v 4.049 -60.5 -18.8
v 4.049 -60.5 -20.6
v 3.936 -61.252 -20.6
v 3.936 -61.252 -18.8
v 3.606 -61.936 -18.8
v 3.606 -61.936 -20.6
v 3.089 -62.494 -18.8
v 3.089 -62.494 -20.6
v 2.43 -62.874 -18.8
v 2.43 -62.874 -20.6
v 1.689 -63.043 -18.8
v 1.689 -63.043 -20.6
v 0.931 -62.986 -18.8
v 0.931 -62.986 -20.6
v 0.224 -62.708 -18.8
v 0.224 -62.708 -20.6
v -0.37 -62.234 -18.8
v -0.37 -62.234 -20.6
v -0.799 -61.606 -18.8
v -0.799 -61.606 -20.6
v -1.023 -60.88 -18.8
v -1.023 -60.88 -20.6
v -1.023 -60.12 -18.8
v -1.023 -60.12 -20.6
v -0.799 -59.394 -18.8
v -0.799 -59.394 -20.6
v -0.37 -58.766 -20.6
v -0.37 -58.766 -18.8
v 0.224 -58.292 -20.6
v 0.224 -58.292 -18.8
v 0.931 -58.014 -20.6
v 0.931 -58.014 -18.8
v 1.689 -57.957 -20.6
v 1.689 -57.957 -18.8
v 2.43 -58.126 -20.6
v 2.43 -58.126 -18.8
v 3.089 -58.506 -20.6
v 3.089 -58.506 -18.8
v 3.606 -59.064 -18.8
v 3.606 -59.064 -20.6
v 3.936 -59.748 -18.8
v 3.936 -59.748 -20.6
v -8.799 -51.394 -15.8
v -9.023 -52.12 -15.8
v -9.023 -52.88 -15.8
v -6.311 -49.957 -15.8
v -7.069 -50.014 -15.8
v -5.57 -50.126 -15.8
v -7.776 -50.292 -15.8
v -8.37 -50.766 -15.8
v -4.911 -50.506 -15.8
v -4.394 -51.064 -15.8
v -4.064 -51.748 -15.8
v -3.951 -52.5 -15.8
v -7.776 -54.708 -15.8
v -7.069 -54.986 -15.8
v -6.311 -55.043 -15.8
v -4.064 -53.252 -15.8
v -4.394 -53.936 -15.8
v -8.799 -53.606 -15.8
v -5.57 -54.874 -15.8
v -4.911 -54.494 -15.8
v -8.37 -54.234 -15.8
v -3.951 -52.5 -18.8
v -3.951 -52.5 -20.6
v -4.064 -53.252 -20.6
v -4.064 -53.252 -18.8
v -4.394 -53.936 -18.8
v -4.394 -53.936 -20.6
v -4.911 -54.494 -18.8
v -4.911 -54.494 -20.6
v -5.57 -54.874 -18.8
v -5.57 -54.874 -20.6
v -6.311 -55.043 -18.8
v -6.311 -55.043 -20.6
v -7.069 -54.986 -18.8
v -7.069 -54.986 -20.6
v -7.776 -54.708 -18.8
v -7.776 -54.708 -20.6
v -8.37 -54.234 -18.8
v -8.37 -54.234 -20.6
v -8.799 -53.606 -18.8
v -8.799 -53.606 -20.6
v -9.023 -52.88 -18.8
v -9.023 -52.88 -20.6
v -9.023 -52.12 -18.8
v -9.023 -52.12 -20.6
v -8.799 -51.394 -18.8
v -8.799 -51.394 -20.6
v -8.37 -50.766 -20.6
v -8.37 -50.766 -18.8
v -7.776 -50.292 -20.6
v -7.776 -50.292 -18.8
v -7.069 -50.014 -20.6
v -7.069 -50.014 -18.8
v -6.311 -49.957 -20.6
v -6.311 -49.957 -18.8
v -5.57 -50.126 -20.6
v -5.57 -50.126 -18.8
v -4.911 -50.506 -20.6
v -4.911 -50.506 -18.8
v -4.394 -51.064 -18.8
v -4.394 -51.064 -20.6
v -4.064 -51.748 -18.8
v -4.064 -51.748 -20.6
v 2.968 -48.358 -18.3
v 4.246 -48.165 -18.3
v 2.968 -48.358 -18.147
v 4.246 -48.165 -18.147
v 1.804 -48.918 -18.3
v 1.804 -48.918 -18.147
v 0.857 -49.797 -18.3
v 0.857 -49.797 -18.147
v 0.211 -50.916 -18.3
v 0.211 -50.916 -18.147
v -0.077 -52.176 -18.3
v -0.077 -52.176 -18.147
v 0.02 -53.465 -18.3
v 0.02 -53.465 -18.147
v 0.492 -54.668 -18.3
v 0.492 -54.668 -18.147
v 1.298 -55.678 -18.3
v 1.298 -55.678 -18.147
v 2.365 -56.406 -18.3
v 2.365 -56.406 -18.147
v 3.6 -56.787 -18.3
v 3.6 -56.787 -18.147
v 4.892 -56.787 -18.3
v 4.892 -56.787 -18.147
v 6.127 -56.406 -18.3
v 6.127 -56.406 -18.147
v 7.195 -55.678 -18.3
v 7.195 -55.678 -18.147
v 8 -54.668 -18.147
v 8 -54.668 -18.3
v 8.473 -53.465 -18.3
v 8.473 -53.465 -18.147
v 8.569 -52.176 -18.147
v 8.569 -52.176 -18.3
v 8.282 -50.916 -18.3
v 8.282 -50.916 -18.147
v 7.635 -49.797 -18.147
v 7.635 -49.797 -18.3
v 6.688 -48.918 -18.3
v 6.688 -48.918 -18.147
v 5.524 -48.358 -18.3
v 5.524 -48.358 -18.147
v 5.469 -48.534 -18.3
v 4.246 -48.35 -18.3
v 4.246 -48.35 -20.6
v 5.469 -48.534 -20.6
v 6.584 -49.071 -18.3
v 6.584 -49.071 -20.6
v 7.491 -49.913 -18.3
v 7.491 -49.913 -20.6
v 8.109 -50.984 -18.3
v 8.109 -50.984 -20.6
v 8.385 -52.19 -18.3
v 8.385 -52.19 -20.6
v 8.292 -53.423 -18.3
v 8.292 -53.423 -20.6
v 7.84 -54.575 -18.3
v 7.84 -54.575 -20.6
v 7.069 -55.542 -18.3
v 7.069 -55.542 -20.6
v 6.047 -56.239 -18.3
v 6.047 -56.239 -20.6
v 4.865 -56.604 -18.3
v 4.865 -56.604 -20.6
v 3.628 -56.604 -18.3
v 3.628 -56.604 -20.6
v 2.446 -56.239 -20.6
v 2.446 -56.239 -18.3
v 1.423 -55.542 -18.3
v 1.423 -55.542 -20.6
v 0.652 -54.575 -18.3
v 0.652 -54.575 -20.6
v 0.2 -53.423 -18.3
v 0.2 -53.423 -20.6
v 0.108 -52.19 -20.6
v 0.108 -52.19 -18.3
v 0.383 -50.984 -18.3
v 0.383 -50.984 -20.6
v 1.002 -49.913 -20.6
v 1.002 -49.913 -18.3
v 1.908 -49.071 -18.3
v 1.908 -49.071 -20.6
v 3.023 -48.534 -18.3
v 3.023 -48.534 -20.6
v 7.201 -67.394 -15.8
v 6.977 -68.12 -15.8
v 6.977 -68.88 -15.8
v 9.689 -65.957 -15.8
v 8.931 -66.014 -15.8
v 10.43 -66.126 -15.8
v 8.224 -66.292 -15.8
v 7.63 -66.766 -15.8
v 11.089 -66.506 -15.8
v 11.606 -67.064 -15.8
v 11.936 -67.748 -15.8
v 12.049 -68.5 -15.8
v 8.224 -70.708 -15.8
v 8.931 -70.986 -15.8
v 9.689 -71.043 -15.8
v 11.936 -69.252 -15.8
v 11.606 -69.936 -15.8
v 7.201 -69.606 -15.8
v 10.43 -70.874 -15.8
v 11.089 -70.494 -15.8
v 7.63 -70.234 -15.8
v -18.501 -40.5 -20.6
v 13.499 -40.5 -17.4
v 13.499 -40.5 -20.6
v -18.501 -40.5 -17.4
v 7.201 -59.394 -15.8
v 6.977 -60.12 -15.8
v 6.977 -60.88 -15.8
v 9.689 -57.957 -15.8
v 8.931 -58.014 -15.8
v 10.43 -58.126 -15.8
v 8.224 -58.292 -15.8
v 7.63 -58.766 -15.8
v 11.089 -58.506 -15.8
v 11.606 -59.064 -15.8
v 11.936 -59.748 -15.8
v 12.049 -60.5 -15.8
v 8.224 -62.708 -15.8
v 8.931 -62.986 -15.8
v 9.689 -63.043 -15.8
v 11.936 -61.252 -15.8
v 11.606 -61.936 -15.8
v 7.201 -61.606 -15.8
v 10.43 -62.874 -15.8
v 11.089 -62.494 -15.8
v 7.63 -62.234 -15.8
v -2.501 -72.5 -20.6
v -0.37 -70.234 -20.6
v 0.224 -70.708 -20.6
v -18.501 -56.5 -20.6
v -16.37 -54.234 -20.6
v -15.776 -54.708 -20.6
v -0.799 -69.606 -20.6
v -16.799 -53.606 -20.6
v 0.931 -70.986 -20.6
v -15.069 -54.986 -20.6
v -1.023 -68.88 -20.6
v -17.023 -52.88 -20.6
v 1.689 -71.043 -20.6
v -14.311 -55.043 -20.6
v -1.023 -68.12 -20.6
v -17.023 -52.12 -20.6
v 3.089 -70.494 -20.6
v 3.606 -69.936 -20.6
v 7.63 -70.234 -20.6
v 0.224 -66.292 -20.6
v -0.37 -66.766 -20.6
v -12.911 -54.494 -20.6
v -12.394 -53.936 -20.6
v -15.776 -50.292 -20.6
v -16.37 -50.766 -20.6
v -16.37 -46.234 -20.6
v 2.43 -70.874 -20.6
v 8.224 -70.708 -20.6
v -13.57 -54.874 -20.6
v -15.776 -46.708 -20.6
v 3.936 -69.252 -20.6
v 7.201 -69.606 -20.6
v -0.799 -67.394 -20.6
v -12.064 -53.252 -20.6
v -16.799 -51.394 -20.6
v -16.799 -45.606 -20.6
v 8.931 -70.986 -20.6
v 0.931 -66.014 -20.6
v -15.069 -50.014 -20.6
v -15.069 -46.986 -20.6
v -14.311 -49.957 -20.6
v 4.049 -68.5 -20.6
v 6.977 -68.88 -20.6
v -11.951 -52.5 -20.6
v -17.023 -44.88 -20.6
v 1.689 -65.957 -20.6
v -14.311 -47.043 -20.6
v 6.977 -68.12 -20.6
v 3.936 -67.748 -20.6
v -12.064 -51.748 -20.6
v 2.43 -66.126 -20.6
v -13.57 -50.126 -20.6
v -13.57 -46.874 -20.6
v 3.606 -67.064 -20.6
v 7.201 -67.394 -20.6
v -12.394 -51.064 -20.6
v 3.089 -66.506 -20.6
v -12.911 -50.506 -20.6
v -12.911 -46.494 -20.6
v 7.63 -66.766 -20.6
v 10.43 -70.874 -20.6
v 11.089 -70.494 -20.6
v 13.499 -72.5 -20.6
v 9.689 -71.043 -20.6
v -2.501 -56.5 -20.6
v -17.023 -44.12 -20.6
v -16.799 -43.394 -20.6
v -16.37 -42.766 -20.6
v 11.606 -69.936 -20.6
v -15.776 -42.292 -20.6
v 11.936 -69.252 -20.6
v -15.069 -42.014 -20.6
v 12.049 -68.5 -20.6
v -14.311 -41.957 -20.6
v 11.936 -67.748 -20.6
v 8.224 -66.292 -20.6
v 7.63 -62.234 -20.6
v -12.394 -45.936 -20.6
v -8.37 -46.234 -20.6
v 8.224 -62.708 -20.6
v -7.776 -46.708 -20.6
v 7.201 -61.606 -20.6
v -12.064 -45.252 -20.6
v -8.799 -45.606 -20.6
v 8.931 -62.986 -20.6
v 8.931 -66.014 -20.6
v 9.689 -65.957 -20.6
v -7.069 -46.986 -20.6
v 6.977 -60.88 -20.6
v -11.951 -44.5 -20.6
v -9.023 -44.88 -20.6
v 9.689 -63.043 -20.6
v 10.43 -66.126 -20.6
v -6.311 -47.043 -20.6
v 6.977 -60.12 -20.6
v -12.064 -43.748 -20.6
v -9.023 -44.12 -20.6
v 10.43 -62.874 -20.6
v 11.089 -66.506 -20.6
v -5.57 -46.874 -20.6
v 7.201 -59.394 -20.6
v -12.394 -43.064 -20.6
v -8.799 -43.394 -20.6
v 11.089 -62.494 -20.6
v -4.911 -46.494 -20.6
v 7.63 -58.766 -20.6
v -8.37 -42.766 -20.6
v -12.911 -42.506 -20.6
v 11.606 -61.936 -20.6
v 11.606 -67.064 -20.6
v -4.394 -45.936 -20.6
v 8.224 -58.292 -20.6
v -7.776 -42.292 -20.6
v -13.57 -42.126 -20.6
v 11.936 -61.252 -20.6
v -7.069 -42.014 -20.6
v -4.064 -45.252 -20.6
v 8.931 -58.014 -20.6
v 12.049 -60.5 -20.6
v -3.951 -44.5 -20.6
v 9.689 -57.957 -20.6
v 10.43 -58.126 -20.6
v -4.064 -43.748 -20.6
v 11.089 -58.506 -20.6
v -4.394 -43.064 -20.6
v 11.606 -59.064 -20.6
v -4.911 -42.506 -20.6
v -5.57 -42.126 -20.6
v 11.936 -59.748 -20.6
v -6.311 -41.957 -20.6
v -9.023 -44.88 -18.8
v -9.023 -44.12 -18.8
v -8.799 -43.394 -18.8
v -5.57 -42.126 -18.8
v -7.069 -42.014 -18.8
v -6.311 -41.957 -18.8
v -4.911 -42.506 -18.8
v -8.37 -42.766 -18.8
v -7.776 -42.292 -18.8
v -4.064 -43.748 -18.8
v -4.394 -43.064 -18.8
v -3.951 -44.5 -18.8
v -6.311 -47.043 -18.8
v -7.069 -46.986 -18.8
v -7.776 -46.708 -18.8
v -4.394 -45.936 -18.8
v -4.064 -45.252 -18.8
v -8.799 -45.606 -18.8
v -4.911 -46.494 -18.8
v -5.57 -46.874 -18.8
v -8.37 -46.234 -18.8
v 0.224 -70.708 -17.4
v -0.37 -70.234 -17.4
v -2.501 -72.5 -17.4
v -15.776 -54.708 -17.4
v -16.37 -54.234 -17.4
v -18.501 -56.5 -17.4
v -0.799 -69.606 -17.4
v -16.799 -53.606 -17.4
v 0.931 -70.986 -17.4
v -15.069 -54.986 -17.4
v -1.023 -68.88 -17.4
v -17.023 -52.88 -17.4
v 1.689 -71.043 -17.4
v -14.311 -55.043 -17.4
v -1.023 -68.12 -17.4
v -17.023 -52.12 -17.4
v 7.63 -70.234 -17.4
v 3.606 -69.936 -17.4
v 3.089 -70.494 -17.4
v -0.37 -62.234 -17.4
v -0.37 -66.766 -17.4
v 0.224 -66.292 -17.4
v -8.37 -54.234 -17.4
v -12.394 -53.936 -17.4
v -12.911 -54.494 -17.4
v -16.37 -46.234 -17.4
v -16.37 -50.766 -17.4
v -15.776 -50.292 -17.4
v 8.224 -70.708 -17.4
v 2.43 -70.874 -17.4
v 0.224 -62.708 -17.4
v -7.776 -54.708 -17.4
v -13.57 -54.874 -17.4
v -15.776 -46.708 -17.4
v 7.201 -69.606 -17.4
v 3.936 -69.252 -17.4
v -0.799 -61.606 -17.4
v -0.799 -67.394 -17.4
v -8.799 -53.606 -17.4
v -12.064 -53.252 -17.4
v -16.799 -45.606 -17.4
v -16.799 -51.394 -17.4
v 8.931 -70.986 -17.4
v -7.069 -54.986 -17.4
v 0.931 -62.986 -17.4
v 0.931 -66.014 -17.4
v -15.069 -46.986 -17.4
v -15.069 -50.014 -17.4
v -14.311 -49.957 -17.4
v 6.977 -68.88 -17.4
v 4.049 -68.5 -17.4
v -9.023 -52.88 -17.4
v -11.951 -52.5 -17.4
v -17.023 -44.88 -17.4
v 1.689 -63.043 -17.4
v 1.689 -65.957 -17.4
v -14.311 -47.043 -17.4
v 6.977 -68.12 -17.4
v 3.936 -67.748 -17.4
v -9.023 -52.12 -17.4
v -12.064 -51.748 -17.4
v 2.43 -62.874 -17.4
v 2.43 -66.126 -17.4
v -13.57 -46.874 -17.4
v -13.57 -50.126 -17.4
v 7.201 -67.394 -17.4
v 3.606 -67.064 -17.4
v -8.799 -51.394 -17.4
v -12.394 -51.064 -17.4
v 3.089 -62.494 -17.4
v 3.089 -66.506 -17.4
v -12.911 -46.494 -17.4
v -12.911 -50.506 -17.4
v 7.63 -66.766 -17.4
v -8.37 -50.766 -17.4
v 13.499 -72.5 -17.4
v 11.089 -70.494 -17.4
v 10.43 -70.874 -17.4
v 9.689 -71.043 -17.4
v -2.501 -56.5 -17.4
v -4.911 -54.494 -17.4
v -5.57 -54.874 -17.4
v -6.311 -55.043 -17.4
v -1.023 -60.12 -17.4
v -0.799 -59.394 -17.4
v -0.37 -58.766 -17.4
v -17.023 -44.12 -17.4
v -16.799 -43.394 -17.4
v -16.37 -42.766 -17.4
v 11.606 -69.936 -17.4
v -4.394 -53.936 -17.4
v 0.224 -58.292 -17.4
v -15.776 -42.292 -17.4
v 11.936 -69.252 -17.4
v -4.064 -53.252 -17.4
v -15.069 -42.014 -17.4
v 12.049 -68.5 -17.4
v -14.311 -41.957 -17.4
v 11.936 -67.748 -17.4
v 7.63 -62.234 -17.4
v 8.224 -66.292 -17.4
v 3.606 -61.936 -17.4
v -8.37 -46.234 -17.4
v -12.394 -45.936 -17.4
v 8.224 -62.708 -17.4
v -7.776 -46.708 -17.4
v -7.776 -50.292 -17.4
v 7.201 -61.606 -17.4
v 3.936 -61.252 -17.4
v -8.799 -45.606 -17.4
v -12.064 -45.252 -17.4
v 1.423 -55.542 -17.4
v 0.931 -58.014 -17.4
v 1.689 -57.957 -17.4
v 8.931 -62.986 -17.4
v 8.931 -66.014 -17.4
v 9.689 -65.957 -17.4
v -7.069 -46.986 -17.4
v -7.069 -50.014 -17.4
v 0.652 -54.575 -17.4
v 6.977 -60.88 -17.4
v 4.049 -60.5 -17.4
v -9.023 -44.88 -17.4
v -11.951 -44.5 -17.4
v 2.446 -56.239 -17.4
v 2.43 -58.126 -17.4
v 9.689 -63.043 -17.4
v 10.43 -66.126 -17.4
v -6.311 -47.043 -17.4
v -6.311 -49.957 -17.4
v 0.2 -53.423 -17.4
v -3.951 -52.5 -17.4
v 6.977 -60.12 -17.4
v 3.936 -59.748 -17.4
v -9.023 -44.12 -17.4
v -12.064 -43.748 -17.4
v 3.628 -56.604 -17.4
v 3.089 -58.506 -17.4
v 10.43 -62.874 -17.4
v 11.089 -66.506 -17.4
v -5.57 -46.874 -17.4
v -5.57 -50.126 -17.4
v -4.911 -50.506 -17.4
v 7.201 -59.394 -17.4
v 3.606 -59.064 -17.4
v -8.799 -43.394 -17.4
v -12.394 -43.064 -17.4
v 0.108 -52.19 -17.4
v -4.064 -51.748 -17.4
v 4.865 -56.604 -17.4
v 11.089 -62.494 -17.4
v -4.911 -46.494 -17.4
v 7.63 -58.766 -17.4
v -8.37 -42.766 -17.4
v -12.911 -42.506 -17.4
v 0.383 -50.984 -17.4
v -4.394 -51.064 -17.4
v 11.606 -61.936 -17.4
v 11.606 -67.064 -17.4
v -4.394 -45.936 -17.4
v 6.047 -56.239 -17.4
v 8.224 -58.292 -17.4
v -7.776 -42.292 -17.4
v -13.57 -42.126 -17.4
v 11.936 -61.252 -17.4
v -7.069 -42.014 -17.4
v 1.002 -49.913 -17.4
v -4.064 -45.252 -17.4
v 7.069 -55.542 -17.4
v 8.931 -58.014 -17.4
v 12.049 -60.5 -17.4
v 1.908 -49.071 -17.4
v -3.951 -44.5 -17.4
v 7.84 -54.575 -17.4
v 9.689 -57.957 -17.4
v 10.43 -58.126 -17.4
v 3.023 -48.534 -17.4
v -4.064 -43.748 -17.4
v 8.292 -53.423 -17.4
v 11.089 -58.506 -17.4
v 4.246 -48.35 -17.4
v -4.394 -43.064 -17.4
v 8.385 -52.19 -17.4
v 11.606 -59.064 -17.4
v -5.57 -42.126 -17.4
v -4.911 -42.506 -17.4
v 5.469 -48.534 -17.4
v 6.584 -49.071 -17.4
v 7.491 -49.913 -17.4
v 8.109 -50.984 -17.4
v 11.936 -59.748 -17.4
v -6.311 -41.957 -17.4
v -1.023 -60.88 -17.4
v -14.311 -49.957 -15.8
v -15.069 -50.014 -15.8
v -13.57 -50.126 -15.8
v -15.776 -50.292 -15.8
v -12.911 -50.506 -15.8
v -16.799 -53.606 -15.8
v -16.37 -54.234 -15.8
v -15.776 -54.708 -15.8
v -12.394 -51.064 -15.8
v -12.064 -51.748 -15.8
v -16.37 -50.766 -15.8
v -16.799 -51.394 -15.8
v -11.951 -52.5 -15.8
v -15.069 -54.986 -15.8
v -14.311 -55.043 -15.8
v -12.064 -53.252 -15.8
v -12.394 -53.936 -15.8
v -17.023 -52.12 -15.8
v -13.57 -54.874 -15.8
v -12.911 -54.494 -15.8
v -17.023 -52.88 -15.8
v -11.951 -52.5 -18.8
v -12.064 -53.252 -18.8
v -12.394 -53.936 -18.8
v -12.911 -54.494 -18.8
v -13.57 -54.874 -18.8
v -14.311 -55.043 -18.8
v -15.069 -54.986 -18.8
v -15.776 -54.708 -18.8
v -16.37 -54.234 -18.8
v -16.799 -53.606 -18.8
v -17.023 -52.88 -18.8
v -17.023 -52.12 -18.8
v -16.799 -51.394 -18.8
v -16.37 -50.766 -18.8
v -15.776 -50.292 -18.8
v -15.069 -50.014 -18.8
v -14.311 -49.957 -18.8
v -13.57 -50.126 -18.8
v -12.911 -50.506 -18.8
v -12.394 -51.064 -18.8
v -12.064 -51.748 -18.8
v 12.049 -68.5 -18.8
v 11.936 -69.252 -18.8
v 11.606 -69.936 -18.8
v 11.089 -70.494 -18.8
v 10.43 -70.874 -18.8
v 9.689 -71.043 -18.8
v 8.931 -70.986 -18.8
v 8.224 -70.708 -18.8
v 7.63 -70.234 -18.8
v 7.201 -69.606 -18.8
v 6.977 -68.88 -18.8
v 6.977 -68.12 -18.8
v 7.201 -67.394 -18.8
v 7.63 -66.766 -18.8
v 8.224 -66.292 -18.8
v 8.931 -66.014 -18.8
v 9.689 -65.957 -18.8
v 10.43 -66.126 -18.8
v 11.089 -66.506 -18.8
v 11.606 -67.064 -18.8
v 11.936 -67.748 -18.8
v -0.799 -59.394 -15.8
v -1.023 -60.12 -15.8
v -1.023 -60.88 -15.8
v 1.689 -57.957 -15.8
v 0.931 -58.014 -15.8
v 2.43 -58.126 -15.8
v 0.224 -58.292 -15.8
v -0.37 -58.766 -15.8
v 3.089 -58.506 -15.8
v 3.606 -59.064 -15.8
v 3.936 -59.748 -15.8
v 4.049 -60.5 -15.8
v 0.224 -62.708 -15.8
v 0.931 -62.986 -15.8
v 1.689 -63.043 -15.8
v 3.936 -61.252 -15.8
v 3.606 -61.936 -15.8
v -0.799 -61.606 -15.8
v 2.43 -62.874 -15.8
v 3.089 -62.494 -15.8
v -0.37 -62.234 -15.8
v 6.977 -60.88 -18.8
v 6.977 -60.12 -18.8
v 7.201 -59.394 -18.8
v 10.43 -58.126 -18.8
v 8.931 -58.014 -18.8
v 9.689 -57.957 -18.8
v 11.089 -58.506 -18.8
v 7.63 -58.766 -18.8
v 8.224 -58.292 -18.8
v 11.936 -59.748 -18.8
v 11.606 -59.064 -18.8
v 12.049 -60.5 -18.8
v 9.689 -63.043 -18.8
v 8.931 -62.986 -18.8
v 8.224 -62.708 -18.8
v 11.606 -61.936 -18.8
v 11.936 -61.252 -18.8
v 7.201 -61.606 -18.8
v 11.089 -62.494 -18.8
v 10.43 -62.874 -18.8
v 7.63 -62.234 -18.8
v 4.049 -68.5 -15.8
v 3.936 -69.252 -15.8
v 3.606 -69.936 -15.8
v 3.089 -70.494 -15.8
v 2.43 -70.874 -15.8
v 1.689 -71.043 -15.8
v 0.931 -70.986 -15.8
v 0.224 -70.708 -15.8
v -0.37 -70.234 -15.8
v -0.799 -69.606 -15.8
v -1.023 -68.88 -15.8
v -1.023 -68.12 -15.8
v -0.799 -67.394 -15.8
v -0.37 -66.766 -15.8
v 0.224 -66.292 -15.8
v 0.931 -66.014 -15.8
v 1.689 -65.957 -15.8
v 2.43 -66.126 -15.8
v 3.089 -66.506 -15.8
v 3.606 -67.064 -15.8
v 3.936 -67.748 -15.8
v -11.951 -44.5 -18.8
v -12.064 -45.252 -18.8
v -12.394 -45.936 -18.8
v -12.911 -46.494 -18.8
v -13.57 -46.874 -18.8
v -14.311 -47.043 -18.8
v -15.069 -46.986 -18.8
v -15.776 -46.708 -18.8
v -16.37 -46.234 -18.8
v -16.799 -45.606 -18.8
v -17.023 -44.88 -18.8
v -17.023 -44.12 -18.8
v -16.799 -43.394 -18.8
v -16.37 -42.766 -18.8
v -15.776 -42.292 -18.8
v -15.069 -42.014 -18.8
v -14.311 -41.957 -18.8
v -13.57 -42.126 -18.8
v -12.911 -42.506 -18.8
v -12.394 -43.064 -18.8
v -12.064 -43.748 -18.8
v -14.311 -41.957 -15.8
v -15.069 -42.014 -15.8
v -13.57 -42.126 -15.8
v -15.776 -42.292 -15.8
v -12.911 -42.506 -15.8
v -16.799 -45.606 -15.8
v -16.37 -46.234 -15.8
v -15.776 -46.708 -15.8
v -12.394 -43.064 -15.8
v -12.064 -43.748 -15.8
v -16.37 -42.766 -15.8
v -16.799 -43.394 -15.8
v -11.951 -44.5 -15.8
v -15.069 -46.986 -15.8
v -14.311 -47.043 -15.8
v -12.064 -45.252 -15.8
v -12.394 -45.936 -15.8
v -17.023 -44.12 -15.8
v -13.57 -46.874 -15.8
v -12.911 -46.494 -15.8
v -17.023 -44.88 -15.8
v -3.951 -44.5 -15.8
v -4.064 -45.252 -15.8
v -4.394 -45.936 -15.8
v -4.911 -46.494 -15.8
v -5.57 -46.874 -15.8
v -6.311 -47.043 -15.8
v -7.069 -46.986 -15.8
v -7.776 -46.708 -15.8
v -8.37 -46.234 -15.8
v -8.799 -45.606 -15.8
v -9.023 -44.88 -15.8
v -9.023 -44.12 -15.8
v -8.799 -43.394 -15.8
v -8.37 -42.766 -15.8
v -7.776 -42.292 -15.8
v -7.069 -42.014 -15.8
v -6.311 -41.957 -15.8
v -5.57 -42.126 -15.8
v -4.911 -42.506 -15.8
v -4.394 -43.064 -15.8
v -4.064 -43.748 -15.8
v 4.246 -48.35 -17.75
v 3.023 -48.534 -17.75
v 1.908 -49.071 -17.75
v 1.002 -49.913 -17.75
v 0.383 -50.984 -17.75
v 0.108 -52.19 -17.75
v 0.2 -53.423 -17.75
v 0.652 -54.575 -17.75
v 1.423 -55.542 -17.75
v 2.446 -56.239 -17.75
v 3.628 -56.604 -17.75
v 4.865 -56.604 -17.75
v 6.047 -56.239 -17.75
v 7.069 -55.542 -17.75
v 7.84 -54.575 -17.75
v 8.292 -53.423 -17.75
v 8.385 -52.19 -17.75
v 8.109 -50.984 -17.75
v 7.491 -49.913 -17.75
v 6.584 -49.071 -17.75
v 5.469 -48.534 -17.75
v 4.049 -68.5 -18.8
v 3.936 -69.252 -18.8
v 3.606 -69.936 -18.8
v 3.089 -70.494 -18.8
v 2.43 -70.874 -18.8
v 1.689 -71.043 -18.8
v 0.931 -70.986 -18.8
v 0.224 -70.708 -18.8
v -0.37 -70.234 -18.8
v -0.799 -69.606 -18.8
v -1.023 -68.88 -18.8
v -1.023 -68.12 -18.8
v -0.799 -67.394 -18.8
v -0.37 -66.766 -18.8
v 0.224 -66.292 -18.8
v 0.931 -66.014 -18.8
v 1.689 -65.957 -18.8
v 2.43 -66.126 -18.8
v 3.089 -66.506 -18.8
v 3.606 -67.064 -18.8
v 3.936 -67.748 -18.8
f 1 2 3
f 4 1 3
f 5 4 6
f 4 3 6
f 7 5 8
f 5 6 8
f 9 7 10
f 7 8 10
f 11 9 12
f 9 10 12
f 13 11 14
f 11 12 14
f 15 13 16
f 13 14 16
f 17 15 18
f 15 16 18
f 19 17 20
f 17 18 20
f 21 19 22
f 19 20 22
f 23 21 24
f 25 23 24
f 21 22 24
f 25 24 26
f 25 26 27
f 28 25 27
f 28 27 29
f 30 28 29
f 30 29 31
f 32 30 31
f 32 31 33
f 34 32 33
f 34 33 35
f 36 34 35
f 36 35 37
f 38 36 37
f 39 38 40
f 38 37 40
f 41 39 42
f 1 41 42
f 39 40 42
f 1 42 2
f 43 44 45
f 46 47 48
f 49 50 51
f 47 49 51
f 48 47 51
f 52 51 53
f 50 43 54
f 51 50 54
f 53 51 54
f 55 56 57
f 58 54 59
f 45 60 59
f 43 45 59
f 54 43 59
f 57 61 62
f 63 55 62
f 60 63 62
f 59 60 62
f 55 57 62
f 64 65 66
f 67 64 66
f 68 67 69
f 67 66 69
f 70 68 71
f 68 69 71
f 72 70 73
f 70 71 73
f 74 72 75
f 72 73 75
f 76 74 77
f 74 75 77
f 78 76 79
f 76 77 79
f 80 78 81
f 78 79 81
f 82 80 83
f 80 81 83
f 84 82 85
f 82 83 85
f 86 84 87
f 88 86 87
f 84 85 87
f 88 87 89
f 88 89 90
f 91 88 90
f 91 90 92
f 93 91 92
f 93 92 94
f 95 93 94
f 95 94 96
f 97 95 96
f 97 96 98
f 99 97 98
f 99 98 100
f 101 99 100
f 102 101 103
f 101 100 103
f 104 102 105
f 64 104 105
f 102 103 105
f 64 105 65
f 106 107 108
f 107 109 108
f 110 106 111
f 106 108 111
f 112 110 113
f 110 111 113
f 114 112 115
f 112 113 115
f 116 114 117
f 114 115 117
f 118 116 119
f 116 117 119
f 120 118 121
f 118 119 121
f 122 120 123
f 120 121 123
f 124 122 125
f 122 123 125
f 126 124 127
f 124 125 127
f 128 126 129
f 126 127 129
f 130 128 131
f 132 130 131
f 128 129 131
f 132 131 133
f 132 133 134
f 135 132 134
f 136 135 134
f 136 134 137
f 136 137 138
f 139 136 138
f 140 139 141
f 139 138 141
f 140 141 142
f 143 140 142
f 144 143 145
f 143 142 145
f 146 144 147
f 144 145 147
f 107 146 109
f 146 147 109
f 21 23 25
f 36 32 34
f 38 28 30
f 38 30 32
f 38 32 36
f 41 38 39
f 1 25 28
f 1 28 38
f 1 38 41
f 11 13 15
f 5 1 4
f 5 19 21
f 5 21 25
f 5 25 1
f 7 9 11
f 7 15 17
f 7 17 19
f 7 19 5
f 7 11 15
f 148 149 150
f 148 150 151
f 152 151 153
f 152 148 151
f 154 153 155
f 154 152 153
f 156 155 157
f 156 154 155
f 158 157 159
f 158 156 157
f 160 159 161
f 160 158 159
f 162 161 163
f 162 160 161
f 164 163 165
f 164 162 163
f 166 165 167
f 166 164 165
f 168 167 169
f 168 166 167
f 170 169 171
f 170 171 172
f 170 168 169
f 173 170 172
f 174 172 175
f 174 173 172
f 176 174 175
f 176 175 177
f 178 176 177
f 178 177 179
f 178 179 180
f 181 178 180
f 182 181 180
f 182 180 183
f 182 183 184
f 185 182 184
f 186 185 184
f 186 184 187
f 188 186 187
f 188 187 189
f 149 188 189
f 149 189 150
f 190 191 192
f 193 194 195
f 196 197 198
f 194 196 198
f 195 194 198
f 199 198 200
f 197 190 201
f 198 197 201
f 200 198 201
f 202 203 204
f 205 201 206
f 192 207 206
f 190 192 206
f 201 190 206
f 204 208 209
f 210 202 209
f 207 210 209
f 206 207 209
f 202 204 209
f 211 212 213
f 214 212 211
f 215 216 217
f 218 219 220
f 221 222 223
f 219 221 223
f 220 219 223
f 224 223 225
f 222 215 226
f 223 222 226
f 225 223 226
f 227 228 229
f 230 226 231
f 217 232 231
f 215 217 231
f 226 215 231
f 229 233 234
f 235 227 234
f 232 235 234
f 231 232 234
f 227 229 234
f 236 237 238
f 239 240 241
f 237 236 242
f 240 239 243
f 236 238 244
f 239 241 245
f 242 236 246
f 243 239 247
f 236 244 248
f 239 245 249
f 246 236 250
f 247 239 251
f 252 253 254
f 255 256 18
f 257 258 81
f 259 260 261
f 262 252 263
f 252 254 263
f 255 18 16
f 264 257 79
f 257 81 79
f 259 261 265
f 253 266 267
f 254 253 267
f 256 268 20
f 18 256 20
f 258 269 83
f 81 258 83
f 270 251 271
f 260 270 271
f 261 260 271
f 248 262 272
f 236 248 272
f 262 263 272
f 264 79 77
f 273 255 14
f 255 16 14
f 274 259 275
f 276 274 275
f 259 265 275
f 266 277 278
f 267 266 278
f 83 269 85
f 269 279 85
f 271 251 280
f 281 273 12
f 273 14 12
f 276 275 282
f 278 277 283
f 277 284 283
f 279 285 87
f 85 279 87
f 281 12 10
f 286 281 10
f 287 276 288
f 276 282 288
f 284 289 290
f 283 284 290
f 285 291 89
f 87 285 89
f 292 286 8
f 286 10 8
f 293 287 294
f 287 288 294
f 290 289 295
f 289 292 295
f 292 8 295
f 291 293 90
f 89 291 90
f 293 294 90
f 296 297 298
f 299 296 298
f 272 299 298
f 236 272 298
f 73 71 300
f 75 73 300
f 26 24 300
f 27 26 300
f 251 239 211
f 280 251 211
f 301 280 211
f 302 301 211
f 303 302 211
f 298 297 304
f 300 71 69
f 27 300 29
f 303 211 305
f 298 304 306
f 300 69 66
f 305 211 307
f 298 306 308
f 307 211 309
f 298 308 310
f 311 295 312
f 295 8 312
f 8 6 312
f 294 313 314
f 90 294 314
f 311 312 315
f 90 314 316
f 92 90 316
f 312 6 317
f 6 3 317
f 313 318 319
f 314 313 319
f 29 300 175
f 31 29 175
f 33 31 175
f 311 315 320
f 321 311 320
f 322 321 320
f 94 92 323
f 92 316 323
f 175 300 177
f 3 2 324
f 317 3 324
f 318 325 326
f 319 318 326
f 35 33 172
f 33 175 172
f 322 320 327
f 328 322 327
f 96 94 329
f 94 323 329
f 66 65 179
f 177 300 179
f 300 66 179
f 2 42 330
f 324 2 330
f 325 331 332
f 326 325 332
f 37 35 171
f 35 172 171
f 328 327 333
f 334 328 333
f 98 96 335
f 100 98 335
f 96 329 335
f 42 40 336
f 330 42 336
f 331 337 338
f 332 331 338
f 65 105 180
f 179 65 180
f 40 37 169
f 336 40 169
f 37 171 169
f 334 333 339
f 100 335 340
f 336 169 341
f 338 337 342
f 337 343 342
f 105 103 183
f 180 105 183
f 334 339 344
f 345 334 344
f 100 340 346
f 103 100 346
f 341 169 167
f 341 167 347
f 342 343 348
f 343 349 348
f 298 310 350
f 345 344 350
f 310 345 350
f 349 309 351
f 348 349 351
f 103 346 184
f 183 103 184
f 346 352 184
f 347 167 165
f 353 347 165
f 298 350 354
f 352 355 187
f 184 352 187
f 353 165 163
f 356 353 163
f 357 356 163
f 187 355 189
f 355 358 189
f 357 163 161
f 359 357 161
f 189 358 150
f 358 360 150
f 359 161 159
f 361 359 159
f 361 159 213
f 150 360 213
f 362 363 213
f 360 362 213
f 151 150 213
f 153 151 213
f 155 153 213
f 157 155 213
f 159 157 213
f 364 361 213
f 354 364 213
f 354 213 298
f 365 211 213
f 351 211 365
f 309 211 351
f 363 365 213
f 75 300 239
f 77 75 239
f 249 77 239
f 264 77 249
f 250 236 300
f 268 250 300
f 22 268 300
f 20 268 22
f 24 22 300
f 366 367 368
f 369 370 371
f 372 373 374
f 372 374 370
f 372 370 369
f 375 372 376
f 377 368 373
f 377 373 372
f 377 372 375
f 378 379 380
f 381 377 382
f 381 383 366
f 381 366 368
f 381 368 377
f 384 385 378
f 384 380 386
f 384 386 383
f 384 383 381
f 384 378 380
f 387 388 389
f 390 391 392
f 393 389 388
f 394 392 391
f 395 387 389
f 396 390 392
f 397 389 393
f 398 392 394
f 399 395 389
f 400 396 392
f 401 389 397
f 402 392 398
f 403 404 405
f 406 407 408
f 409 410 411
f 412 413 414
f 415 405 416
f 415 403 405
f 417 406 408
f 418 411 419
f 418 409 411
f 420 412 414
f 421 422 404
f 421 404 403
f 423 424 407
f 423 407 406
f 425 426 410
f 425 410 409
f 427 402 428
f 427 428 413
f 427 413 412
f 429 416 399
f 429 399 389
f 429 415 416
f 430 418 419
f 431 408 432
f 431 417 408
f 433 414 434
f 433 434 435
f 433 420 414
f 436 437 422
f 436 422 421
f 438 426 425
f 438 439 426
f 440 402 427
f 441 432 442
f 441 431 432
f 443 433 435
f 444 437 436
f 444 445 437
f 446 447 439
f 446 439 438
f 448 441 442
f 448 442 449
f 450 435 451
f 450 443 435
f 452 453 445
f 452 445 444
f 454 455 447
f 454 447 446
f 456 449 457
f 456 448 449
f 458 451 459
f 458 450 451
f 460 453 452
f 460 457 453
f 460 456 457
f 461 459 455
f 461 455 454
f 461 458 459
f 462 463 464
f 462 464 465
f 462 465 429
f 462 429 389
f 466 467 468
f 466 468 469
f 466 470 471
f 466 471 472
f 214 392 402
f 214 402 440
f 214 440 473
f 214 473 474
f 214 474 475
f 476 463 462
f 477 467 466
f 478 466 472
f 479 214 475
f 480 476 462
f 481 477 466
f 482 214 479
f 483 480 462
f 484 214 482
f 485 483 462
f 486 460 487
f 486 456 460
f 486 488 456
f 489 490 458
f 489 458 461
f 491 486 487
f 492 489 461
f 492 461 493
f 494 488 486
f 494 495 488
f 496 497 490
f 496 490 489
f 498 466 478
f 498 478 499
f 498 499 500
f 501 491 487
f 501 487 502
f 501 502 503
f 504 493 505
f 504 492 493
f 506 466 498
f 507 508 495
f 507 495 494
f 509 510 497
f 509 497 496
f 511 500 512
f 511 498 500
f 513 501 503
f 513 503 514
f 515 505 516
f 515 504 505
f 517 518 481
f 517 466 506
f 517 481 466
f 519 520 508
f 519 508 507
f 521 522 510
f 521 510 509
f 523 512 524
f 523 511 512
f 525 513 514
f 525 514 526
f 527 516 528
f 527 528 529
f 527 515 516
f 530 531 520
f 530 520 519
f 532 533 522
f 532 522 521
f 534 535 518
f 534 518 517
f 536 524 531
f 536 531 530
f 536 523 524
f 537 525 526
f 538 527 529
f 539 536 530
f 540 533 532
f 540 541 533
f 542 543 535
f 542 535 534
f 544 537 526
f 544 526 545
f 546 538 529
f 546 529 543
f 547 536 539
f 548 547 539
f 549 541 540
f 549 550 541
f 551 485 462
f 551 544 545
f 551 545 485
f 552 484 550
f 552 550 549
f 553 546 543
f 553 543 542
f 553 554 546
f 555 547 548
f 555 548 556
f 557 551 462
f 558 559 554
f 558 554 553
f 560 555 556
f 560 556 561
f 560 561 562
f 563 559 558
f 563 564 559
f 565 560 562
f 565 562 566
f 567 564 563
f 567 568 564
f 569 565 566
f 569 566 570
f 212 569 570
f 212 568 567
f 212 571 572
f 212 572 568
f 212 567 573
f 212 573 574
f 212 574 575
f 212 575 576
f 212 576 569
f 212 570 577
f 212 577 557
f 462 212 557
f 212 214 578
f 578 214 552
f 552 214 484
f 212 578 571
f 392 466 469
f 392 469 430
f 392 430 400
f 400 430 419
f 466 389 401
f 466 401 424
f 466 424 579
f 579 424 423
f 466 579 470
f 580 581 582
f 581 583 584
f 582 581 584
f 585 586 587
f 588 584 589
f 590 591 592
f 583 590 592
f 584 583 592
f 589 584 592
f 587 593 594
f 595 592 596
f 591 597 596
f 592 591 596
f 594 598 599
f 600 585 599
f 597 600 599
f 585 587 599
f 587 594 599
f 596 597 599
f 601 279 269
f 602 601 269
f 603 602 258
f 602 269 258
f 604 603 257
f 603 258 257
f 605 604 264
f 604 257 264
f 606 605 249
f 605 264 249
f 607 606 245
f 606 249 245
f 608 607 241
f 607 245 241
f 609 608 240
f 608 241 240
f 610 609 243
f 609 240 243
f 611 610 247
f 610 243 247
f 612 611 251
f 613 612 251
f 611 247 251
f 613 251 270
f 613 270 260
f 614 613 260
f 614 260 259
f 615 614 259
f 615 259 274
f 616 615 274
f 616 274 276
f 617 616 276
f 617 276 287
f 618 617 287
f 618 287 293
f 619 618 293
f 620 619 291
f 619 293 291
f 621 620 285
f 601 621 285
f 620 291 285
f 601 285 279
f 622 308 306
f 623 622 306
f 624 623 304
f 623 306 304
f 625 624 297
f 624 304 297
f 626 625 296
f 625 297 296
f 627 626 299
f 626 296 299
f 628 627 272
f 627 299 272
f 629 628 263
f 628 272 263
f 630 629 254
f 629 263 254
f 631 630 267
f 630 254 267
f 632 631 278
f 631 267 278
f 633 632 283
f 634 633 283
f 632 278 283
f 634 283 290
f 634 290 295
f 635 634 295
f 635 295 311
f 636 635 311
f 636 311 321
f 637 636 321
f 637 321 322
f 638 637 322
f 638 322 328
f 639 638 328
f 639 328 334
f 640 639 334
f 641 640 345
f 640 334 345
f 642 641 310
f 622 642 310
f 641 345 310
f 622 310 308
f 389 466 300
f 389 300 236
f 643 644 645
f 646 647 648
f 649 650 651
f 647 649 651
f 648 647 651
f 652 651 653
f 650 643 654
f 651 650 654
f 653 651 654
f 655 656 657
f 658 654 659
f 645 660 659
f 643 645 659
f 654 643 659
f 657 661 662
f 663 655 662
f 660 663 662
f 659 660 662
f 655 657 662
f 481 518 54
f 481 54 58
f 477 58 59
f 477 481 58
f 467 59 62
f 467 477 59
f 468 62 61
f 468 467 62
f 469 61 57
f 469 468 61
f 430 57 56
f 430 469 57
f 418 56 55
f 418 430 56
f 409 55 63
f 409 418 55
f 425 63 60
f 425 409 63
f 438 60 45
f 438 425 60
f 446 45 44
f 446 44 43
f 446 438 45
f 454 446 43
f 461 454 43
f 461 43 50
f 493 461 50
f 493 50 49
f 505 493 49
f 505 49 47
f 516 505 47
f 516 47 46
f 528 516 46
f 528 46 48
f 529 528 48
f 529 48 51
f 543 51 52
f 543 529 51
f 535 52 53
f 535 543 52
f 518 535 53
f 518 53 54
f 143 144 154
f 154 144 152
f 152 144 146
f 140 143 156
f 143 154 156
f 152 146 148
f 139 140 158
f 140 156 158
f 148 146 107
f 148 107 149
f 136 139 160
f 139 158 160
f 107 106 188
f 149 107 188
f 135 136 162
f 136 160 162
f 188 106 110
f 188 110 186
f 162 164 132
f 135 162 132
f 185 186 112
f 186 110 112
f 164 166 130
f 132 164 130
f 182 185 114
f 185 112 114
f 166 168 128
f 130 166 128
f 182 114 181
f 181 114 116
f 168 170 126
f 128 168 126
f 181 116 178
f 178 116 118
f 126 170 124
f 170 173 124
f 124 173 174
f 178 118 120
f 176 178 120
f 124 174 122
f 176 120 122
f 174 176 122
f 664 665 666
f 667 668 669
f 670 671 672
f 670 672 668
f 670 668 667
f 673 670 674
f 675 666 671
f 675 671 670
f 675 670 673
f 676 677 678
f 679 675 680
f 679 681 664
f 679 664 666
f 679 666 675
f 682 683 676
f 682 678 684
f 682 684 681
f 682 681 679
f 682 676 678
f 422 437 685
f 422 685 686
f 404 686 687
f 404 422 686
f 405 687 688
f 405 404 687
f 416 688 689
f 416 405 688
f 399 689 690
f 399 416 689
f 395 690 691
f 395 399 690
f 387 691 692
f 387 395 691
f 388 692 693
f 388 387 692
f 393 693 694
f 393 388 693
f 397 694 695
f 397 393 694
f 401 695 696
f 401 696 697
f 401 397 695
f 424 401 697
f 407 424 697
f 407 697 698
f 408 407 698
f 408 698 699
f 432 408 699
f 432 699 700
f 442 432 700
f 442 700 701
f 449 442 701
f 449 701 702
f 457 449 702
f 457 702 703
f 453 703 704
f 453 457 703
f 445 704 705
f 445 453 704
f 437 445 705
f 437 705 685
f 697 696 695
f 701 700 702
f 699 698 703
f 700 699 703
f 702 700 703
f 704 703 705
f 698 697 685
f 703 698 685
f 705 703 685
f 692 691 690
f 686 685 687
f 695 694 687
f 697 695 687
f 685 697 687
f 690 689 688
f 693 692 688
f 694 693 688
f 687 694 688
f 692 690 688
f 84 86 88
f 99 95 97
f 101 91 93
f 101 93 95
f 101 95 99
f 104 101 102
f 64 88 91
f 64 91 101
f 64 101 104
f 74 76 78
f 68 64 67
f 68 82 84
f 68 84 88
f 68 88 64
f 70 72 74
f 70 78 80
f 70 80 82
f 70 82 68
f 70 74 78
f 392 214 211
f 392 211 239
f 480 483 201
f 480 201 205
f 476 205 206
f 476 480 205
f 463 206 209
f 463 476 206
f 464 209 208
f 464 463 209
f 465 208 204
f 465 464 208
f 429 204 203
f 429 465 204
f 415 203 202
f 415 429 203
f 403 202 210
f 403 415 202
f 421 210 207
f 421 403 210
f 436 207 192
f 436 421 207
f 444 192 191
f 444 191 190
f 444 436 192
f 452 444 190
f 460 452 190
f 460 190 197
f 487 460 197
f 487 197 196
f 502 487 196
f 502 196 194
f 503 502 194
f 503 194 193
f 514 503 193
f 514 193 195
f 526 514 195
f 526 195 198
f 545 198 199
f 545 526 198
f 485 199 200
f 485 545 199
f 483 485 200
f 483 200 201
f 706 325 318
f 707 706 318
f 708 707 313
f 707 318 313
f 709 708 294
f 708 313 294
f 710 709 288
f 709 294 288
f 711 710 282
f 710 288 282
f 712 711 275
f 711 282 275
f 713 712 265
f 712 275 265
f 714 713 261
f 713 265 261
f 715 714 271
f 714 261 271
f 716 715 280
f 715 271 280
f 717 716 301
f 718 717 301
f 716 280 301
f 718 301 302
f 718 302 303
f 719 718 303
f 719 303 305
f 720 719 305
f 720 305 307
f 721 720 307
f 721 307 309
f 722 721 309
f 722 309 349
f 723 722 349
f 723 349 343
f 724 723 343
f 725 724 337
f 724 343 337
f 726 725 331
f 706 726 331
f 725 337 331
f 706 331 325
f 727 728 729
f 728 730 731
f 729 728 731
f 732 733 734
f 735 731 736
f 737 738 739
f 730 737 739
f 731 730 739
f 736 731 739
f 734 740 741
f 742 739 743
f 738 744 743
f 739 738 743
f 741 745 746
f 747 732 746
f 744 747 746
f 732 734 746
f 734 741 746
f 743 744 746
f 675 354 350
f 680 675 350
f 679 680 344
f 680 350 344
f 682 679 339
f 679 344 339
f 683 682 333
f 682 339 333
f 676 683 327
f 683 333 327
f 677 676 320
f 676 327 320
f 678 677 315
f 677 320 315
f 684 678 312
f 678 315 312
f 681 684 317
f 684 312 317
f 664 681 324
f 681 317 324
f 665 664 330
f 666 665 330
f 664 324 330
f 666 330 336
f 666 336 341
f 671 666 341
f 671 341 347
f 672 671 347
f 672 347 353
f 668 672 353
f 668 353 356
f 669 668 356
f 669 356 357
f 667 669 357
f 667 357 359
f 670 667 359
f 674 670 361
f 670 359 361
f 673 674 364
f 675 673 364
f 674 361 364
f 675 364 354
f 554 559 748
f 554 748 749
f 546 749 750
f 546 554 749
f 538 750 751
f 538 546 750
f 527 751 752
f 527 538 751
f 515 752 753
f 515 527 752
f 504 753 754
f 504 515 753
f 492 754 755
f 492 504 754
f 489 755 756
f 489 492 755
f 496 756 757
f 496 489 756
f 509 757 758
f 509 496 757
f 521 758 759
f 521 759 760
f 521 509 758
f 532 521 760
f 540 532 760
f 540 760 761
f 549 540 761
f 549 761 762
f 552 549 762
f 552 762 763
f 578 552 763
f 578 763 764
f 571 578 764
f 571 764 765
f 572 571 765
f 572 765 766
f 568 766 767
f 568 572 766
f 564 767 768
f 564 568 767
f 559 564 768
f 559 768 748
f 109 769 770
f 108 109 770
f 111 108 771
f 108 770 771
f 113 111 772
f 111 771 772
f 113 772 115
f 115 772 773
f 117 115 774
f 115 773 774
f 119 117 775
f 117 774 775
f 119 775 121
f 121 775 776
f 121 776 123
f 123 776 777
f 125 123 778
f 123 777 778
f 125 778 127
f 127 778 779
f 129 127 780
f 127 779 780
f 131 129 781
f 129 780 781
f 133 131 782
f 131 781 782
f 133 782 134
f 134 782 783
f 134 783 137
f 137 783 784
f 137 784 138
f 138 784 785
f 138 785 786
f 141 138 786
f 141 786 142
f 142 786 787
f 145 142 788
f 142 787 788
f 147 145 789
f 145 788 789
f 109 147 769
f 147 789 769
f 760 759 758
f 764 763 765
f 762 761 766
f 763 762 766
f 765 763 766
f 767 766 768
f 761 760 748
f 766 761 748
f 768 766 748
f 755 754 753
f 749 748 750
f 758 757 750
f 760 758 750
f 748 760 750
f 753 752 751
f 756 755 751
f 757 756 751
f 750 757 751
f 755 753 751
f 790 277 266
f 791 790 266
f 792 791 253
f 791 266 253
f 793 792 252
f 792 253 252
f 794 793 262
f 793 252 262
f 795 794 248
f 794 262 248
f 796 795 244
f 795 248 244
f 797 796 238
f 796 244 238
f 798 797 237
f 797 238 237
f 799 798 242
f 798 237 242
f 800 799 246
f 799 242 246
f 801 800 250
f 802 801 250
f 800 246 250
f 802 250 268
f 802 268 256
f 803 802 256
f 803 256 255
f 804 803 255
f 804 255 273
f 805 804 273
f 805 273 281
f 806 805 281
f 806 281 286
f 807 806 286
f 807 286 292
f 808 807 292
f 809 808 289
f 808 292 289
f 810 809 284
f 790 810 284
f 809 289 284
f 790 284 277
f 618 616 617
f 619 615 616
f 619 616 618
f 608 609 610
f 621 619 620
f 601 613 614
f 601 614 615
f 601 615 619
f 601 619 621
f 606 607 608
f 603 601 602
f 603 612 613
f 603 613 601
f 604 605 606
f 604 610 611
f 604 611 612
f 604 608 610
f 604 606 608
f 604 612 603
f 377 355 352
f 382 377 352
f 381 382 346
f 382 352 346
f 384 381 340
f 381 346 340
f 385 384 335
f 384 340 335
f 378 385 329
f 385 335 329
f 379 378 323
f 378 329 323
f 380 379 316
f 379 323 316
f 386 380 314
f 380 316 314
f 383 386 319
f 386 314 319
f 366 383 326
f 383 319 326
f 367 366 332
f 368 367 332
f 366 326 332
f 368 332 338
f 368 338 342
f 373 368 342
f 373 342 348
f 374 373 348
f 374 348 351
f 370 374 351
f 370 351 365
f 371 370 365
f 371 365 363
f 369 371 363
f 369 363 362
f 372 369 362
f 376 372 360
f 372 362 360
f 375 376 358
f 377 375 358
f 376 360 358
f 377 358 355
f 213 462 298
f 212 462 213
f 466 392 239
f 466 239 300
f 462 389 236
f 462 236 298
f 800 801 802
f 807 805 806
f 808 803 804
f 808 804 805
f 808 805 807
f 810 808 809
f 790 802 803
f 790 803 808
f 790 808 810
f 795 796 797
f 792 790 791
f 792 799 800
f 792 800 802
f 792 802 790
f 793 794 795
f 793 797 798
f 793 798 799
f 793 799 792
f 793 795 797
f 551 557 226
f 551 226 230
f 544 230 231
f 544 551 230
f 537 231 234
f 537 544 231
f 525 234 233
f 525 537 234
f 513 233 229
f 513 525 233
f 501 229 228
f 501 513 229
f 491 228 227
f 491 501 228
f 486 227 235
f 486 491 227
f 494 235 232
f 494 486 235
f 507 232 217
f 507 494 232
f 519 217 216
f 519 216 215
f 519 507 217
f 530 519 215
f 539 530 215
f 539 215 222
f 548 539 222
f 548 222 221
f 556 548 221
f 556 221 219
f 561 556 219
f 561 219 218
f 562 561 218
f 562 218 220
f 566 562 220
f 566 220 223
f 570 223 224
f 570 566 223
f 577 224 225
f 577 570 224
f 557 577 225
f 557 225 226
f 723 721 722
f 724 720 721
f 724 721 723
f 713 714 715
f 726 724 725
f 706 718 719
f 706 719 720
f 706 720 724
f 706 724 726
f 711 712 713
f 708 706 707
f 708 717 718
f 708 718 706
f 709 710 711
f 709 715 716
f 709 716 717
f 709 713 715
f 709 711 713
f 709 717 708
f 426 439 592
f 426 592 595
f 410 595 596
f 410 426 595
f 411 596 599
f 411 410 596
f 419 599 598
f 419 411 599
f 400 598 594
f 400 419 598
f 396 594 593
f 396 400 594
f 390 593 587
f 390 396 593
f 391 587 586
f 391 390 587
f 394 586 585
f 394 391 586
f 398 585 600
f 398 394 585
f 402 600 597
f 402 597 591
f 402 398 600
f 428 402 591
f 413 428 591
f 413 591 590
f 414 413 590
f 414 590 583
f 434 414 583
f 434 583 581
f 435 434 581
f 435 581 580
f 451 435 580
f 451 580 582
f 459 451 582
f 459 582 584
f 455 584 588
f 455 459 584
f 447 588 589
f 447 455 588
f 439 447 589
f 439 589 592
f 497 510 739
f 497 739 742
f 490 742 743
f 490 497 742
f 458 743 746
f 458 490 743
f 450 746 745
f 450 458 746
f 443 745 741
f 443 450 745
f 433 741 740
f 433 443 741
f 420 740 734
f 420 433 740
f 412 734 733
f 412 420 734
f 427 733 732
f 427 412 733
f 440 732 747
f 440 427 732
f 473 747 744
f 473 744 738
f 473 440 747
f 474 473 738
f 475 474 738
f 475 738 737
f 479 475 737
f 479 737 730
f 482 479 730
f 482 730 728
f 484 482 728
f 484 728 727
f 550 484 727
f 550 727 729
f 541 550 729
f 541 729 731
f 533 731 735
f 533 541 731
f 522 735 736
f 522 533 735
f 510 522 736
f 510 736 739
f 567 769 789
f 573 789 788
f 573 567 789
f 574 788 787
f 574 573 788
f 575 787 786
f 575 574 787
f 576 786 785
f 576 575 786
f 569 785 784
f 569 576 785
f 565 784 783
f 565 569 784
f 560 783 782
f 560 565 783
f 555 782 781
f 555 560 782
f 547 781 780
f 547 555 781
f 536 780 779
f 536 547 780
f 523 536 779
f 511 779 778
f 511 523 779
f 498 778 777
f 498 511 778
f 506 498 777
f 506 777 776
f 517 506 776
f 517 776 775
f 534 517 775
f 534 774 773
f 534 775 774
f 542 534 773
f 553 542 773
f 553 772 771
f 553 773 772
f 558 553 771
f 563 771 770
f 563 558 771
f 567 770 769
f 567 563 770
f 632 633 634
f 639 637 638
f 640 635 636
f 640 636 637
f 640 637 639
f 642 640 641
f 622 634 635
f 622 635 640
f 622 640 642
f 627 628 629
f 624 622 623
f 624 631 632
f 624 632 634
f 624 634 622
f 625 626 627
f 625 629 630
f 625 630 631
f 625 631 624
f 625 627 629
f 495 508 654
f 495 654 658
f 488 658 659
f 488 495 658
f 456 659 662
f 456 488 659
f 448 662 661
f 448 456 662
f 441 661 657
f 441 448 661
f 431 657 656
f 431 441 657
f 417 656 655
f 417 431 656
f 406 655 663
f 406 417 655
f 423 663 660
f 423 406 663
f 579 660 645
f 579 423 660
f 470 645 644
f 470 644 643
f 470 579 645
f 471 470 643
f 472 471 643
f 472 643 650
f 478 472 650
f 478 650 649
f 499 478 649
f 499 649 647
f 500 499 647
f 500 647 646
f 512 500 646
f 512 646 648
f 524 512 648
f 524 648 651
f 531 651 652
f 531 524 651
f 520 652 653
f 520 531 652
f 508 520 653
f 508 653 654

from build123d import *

# Parameters (mm, degrees)
SKETCH1_R           = 4.15
BOSS_EXTRUDE1_DEPTH = 3.2
CUT_EXTRUDE3_START  = 3.2
SKETCH1_3_R         = 2.55
CUT_EXTRUDE3_DEPTH  = 1.8
SKETCH1_4_R         = 2.55
BOSS_EXTRUDE2_DEPTH = 1.6


with BuildPart() as part:
    # Sketch1 → Boss-Extrude1 (new body)
    with BuildSketch(Plane(origin=(0, 0, -17.400004116), x_dir=(-1, 0, 0), z_dir=(0, 0, -1))):
        Polygon((2.501166814, -72.5), (-13.498833186, -72.5), (-13.498833186, -40.5), (18.501166814, -40.5), (18.501166814, -56.5), (2.501166814, -56.5), align=None)
        with Locations(Location((-4.246216621, -52.5, 0), (0, 0, 90))):
            Circle(SKETCH1_R, mode=Mode.SUBTRACT)
    extrude(amount=BOSS_EXTRUDE1_DEPTH)

    # Sketch1<3> → Cut-Extrude3 (cut)
    with BuildSketch(Plane(origin=(0, 0, -17.400004116), x_dir=(-1, 0, 0), z_dir=(0, 0, -1)).offset(CUT_EXTRUDE3_START)):
        with Locations(Location((6.501166814, -52.5, 0), (0, 0, 180))):
            Circle(SKETCH1_3_R)
        with Locations(Location((6.501166814, -44.5, 0), (0, 0, 180))):
            Circle(SKETCH1_3_R)
        with Locations(Location((14.501166814, -44.5, 0), (0, 0, 180))):
            Circle(SKETCH1_3_R)
        with Locations(Location((14.501166814, -52.5, 0), (0, 0, 180))):
            Circle(SKETCH1_3_R)
        with Locations(Location((-9.498833186, -60.5, 0), (0, 0, 180))):
            Circle(SKETCH1_3_R)
        with Locations(Location((-1.498833186, -60.5, 0), (0, 0, 180))):
            Circle(SKETCH1_3_R)
        with Locations(Location((-1.498833186, -68.5, 0), (0, 0, 180))):
            Circle(SKETCH1_3_R)
        with Locations(Location((-9.498833186, -68.5, 0), (0, 0, 180))):
            Circle(SKETCH1_3_R)
    extrude(amount=-CUT_EXTRUDE3_DEPTH, mode=Mode.SUBTRACT)

    # Sketch1<4> → Boss-Extrude2 (add)
    with BuildSketch(Plane(origin=(0, 0, -17.400004116), x_dir=(-1, 0, 0), z_dir=(0, 0, -1))):
        with Locations(Location((6.501166814, -44.5, 0), (0, 0, 180))):
            Circle(SKETCH1_4_R)
        with Locations(Location((14.501166814, -44.5, 0), (0, 0, 180))):
            Circle(SKETCH1_4_R)
        with Locations(Location((14.501166814, -52.5, 0), (0, 0, 180))):
            Circle(SKETCH1_4_R)
        with Locations(Location((6.501166814, -52.5, 0), (0, 0, 180))):
            Circle(SKETCH1_4_R)
        with Locations(Location((-1.498833186, -60.5, 0), (0, 0, 180))):
            Circle(SKETCH1_4_R)
        with Locations(Location((-1.498833186, -68.5, 0), (0, 0, 180))):
            Circle(SKETCH1_4_R)
        with Locations(Location((-9.498833186, -60.5, 0), (0, 0, 180))):
            Circle(SKETCH1_4_R)
        with Locations(Location((-9.498833186, -68.5, 0), (0, 0, 180))):
            Circle(SKETCH1_4_R)
    extrude(amount=-BOSS_EXTRUDE2_DEPTH)

    # Sketch2 → Cut-Revolve1 (revolve, cut)
    with BuildSketch(Plane(origin=(4.246216621, -52.5, -15.300004116), x_dir=(0, 0, 1), z_dir=(-1, 0, 0))):
        Polygon((-2.846789772, 4.335), (-1.913929092, 3.899999921), (-3, 3.900000008), (-3, 4.335), align=None)
    revolve(axis=Axis((4.246216621, -52.5, -17.665004136), (0, 0, 1)), mode=Mode.SUBTRACT)


solid = part.part
